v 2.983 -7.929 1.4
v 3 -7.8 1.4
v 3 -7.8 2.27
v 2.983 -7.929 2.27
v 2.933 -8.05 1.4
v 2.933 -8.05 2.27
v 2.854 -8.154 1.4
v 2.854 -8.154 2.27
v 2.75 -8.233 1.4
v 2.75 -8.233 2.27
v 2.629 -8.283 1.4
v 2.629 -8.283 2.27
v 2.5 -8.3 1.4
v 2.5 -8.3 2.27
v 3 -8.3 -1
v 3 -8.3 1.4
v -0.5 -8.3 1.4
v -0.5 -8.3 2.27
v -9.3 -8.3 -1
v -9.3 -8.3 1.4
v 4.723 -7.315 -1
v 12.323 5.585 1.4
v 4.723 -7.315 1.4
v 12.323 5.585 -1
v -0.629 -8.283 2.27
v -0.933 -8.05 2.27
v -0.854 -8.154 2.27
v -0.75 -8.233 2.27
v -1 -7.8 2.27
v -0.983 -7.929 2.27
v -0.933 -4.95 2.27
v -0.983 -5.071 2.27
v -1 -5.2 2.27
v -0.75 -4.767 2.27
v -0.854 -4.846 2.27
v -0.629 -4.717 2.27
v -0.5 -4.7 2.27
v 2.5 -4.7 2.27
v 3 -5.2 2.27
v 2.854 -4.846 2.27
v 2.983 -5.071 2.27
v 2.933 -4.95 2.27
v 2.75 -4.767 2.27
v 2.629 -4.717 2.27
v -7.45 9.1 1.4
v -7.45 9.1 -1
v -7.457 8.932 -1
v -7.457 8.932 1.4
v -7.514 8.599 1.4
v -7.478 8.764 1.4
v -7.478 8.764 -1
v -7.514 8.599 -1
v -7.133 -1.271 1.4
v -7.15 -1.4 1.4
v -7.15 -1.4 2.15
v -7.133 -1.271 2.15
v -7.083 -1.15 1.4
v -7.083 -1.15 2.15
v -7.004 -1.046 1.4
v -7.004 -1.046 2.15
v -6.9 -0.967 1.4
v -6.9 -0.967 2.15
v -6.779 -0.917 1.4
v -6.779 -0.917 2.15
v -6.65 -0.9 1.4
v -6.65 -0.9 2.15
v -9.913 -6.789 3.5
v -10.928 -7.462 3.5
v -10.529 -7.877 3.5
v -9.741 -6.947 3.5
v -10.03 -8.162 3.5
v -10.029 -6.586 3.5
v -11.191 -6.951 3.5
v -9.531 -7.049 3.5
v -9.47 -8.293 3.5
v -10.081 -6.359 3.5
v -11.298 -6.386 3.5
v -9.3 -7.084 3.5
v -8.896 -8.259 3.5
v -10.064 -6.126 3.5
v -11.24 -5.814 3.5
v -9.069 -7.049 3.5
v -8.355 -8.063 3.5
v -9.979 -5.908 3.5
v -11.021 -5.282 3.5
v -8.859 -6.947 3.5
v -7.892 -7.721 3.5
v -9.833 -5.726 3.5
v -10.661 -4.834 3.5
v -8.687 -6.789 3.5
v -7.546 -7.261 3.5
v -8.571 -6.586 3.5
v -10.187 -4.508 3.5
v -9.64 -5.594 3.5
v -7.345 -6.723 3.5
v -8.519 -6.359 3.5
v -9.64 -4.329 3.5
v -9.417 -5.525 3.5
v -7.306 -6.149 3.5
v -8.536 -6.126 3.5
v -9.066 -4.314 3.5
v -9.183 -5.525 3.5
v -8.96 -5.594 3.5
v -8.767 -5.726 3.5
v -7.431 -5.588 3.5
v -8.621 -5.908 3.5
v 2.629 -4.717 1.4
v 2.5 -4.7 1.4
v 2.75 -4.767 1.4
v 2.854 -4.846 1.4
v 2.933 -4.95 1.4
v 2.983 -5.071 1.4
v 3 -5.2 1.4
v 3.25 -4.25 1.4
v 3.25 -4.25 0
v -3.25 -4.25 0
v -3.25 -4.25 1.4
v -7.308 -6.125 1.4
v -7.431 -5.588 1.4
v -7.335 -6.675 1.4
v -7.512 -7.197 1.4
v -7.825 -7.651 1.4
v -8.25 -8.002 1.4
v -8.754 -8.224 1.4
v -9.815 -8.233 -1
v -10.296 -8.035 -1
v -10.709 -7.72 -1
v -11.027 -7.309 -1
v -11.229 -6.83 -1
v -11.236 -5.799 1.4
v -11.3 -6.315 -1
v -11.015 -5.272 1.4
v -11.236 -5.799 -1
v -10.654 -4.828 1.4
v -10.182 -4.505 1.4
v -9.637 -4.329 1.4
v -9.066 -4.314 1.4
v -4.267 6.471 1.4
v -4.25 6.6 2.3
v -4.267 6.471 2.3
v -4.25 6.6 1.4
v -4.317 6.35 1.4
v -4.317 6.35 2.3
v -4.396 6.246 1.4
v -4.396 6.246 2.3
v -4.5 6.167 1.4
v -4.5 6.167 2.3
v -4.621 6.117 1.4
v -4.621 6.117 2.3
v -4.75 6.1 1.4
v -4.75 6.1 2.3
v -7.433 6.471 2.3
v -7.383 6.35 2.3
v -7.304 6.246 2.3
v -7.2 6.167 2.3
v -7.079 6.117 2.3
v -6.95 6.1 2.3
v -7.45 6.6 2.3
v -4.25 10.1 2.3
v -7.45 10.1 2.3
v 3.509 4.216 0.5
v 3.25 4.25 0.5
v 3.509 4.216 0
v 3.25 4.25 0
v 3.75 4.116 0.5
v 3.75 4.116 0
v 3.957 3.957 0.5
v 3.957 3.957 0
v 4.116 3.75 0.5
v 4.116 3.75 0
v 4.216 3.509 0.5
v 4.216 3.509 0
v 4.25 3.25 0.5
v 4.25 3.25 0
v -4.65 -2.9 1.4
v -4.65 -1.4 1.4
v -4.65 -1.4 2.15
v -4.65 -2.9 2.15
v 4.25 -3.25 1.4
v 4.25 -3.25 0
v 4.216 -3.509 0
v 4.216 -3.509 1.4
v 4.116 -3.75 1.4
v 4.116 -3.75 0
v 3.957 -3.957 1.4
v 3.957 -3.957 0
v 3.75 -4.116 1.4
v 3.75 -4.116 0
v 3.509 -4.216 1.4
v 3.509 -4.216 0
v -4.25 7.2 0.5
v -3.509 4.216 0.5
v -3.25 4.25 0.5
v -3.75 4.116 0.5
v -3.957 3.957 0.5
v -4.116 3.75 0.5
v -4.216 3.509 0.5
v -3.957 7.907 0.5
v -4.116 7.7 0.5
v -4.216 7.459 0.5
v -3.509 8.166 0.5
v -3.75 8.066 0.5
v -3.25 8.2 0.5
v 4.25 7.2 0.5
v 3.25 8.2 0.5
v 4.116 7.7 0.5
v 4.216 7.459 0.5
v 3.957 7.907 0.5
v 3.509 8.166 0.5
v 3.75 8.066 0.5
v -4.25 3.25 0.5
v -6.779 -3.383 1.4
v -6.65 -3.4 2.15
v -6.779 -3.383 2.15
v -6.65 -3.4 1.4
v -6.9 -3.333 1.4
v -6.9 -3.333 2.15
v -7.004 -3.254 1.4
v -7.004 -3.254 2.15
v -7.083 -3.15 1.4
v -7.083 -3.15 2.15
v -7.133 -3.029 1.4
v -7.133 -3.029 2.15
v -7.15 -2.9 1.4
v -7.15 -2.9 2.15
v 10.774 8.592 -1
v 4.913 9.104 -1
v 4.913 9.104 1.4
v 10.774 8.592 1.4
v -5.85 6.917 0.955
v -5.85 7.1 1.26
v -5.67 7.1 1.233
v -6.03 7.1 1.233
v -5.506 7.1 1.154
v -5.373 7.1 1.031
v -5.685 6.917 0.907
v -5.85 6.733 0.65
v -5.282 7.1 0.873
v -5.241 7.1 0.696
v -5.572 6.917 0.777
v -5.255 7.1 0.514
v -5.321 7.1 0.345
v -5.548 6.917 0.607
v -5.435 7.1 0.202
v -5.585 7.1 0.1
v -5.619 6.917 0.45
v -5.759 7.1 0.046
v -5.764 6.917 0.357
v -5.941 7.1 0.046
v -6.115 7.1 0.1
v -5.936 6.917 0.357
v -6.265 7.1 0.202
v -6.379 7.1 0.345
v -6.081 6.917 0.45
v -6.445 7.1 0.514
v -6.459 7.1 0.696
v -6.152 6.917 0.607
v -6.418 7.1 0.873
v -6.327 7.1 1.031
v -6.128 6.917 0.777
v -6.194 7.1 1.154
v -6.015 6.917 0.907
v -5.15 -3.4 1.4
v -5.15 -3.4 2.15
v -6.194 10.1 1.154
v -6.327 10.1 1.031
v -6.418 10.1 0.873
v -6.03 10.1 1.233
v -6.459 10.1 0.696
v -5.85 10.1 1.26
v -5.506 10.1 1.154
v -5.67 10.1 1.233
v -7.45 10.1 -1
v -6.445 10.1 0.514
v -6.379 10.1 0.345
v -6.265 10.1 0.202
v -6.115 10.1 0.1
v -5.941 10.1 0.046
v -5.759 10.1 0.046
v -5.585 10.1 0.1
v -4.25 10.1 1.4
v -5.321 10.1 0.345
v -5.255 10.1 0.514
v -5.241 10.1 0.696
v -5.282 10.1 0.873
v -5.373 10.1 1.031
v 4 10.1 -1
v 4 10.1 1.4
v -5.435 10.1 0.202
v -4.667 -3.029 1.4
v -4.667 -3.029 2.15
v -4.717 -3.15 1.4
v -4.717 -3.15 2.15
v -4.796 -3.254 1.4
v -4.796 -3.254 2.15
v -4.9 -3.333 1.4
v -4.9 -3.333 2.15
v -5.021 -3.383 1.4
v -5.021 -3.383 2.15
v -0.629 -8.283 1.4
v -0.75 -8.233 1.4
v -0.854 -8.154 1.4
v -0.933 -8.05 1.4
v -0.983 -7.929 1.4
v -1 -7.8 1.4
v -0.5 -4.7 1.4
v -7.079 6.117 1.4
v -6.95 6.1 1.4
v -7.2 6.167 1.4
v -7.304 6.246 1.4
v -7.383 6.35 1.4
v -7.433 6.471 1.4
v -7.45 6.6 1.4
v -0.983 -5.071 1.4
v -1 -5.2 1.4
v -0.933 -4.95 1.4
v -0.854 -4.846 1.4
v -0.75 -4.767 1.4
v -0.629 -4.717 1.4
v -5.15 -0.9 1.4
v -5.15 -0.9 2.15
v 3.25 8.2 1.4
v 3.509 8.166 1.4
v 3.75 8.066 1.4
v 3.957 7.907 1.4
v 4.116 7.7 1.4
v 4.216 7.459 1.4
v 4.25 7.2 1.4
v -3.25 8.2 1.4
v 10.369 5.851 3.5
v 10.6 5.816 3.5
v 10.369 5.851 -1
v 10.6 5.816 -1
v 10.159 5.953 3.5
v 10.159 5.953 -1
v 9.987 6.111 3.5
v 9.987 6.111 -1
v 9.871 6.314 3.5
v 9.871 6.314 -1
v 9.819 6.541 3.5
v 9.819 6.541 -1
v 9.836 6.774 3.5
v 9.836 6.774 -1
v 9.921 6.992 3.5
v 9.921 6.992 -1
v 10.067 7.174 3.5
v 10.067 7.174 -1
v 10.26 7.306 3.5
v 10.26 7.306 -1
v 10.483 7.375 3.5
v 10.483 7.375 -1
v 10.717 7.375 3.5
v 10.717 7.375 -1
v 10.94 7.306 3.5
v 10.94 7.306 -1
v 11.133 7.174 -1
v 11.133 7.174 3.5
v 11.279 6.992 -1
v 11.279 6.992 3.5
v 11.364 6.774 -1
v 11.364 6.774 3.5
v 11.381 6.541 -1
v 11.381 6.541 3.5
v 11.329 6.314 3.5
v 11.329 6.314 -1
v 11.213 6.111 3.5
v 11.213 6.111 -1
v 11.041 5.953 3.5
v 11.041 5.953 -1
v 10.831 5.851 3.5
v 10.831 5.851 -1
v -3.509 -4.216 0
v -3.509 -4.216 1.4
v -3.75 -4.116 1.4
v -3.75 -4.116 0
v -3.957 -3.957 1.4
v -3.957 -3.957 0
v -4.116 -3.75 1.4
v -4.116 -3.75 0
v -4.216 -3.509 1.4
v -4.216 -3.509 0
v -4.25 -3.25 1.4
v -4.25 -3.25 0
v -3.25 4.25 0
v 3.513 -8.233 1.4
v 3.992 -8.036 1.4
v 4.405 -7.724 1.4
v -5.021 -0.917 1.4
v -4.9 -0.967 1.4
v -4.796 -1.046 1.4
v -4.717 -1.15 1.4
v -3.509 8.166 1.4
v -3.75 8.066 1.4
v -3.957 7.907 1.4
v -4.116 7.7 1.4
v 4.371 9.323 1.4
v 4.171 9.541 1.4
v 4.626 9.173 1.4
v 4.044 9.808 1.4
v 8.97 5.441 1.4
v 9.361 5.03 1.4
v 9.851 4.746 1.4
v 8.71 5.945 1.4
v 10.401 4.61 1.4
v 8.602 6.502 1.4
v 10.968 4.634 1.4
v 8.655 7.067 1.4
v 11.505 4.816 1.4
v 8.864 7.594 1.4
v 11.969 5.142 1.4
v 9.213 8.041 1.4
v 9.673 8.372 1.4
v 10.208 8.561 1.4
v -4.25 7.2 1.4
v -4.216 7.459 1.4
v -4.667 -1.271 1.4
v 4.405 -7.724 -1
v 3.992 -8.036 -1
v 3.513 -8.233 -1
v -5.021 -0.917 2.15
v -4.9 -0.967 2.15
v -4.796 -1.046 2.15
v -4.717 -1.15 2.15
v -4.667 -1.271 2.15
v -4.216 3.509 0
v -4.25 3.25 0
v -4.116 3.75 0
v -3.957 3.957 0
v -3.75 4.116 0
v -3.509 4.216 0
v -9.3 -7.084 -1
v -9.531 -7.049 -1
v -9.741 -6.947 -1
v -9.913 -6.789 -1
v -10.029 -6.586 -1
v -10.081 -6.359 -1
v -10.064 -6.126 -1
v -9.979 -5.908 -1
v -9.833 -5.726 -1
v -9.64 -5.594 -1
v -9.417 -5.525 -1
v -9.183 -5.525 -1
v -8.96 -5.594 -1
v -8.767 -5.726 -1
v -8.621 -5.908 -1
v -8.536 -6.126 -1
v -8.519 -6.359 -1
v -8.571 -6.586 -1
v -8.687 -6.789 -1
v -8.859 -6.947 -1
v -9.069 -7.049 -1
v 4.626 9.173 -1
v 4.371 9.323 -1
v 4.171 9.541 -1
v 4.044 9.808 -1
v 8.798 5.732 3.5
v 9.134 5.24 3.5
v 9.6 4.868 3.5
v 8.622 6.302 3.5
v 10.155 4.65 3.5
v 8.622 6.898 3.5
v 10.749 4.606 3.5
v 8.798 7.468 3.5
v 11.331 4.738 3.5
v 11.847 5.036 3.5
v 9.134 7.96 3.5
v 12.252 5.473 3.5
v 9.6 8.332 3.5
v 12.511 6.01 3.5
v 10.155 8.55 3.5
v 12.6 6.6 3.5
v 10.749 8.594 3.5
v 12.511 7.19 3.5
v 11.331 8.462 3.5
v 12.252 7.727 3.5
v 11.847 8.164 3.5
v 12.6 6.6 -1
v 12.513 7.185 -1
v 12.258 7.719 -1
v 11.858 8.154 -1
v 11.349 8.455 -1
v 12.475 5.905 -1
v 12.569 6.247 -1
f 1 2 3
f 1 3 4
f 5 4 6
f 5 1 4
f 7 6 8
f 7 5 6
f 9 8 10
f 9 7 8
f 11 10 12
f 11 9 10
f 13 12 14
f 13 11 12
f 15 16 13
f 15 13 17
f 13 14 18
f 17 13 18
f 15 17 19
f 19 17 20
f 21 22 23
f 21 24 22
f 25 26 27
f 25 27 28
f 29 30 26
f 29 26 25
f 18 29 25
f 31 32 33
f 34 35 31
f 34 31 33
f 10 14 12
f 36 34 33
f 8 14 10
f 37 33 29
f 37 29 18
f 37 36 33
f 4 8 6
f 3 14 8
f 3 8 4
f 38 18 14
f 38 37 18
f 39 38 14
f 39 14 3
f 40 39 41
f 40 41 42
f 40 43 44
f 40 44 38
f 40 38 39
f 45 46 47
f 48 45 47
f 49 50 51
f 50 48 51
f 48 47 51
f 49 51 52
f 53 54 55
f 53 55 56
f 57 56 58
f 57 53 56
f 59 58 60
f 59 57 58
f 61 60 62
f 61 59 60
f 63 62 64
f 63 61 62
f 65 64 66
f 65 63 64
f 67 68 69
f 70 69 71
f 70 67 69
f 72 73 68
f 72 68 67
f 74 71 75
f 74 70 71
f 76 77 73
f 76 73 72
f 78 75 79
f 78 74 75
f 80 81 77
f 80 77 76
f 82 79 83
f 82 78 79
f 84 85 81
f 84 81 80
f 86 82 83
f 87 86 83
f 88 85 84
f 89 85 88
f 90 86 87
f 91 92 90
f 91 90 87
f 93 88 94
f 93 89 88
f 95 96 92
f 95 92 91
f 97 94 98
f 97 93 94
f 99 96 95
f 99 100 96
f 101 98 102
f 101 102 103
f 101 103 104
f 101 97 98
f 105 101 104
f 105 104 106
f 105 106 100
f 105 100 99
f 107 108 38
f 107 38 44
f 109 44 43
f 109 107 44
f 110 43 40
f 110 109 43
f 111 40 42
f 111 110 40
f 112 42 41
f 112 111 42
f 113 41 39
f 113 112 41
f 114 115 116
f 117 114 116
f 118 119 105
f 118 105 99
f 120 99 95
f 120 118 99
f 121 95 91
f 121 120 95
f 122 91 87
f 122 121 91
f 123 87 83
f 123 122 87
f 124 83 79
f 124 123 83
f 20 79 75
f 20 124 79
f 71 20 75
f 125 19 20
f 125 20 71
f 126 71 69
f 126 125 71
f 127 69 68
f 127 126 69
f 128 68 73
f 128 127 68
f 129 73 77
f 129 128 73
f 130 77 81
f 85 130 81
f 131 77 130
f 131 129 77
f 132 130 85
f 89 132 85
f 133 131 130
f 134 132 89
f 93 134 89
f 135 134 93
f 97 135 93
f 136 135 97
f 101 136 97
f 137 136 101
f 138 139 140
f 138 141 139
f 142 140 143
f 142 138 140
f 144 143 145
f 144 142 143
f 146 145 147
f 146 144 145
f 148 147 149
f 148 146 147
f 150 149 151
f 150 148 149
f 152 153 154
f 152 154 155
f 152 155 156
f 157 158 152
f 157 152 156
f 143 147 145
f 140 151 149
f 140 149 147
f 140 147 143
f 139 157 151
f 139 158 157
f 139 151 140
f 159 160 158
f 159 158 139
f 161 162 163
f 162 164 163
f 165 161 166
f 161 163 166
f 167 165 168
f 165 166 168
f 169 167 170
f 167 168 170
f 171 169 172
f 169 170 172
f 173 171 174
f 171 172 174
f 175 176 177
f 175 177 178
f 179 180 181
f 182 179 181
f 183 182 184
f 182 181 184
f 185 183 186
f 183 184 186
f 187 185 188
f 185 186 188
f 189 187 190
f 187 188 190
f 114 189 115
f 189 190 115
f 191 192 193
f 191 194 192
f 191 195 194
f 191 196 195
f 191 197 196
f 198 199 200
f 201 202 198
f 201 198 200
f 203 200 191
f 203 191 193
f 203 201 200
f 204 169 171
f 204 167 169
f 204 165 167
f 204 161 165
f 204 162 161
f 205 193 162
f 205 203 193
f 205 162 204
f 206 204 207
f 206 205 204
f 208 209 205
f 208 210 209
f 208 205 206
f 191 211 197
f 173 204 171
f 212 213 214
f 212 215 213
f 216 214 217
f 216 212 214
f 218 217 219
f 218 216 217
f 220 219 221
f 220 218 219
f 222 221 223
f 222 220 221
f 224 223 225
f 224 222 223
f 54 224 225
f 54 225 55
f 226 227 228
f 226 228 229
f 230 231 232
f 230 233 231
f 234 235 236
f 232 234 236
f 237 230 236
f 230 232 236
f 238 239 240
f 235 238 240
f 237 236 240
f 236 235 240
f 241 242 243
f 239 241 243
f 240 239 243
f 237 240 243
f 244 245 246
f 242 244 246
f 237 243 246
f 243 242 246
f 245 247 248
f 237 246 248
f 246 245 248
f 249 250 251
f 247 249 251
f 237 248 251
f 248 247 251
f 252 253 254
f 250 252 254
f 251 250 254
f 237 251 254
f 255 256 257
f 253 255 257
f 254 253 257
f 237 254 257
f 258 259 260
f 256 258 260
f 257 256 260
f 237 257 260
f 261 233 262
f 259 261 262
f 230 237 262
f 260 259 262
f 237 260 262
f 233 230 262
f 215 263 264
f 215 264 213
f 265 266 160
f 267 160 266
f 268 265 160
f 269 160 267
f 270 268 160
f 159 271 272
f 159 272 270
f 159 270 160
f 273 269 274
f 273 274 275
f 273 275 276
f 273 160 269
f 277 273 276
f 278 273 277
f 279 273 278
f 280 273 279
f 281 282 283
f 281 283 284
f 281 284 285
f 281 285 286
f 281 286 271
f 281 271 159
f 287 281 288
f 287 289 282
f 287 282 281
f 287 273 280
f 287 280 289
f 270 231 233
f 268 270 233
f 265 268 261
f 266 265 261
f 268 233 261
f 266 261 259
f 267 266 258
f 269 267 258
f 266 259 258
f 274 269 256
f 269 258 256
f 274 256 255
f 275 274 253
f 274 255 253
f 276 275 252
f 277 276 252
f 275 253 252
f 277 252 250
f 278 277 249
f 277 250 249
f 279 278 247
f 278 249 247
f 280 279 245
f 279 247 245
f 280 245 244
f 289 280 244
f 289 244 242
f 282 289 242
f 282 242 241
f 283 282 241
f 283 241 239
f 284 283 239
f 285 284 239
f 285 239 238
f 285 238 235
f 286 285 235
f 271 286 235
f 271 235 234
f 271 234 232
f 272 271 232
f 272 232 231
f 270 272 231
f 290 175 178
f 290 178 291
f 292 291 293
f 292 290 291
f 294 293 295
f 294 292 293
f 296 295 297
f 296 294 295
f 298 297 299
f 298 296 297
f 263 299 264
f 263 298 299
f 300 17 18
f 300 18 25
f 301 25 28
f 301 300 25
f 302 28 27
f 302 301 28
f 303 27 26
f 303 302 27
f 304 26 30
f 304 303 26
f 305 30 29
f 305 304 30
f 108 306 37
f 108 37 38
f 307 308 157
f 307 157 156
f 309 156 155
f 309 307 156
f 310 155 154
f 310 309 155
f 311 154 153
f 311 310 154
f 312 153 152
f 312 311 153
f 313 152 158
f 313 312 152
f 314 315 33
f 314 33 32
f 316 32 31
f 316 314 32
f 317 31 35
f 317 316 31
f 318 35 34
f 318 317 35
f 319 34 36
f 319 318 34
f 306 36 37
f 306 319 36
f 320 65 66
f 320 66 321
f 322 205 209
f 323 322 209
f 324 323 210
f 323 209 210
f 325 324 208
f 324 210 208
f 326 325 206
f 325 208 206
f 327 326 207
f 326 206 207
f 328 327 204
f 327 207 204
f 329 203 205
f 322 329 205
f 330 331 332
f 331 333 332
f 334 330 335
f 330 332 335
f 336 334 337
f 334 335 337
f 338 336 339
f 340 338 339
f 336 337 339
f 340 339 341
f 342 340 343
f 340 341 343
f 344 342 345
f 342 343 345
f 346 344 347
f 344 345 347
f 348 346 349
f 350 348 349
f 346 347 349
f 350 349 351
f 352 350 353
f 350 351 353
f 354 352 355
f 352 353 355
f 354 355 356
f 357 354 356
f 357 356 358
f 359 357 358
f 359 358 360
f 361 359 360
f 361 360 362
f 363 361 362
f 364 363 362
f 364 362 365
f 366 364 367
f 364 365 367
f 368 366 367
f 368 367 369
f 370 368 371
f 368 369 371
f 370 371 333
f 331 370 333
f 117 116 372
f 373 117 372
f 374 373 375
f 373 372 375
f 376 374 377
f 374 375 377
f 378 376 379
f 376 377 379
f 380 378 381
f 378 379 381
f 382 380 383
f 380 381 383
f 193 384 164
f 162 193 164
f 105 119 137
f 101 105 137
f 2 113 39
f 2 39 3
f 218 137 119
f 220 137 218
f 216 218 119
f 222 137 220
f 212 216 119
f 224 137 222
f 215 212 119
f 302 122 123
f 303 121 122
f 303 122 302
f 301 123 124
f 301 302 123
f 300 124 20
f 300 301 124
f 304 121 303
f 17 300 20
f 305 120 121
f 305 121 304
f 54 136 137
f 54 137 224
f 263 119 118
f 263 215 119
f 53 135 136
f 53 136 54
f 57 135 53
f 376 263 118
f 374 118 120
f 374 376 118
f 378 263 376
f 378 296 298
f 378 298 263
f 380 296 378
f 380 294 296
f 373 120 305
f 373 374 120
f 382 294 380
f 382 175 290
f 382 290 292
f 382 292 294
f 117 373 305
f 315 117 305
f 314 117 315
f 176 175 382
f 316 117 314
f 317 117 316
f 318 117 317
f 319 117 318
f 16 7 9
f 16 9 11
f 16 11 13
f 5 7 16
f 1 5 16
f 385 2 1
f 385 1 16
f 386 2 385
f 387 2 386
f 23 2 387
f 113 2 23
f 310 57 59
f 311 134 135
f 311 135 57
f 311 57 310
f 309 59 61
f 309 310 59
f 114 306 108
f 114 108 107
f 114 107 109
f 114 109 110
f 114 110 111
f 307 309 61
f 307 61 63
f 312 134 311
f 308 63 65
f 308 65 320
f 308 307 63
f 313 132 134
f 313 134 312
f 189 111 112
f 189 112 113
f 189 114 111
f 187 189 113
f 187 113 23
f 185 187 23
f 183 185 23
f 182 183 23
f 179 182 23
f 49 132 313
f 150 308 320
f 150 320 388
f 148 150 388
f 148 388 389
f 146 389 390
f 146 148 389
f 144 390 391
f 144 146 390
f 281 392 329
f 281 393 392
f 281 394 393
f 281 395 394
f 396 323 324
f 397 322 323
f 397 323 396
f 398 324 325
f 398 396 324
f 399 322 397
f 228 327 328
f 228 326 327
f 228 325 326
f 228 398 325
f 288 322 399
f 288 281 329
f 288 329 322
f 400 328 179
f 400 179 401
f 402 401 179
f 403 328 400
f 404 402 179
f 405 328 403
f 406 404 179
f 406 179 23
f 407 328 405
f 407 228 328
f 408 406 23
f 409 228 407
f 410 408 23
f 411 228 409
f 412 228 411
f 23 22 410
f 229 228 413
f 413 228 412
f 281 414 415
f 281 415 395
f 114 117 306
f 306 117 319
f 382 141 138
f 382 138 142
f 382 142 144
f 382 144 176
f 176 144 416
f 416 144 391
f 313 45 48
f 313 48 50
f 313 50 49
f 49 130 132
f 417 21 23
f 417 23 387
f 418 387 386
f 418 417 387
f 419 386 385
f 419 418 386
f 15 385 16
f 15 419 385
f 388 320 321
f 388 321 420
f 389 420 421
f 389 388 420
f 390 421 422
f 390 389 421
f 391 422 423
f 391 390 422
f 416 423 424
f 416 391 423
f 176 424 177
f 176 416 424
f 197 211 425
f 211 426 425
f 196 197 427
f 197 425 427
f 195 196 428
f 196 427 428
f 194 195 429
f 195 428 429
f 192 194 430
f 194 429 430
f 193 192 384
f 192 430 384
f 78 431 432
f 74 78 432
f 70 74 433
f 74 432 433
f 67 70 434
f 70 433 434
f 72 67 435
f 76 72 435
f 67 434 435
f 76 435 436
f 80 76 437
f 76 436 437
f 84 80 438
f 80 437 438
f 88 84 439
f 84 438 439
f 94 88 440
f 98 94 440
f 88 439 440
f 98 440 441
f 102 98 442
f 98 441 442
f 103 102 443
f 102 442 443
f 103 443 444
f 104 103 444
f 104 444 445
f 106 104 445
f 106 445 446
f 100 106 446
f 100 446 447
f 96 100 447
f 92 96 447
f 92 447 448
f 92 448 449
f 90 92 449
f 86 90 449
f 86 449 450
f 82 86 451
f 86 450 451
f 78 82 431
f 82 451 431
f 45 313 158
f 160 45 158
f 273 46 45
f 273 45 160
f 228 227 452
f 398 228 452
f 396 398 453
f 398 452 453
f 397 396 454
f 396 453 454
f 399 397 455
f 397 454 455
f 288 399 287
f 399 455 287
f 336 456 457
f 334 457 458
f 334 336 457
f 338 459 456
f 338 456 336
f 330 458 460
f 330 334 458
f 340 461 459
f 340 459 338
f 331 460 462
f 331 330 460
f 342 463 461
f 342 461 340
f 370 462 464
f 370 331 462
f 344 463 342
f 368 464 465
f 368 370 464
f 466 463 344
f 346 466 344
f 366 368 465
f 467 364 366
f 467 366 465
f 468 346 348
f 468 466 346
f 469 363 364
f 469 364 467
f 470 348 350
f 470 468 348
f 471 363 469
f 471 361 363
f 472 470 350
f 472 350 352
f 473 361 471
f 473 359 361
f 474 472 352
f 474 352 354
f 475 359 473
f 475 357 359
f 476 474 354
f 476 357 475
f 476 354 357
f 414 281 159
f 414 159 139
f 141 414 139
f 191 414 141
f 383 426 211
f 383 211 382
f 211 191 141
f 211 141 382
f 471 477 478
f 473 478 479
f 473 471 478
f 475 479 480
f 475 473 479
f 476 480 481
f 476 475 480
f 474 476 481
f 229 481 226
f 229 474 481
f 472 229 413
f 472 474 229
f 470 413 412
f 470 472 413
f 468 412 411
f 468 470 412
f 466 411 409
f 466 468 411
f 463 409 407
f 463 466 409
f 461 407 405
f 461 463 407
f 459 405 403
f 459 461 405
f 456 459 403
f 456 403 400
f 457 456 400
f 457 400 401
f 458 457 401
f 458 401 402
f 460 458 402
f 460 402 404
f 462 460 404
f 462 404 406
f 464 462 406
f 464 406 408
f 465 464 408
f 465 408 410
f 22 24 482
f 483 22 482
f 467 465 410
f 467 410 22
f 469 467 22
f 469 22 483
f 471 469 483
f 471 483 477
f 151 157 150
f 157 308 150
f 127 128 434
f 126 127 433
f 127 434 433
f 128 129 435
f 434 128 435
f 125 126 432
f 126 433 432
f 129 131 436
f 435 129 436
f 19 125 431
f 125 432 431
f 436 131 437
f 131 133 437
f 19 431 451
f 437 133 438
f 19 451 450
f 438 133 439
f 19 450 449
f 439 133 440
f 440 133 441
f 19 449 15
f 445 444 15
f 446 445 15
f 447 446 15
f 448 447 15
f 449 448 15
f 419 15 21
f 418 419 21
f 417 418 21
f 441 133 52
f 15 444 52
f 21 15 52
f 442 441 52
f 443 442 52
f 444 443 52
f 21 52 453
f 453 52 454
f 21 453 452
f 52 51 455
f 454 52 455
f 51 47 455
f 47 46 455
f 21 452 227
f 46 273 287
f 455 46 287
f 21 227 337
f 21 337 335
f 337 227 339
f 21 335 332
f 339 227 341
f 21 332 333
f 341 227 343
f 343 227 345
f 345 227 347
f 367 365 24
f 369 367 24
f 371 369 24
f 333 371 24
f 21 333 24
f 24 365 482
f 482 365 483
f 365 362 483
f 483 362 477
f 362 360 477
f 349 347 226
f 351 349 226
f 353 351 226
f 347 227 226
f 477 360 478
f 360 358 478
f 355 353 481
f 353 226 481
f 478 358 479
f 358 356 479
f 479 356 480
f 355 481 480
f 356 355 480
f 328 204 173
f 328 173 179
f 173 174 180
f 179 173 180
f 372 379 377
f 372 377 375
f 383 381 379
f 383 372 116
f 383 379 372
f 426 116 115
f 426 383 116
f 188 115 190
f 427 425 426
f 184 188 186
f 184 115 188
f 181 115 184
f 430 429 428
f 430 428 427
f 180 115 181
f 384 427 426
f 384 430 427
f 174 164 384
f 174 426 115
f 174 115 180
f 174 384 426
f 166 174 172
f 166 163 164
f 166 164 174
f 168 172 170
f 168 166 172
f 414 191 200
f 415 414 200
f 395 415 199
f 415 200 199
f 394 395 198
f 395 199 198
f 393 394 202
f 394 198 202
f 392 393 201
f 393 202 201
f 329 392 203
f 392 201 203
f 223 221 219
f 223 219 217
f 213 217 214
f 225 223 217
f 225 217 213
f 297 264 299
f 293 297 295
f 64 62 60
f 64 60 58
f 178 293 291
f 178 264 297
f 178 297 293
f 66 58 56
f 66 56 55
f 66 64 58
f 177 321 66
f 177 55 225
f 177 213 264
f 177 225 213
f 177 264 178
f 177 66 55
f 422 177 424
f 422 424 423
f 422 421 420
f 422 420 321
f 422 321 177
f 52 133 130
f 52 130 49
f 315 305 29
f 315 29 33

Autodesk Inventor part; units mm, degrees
ref_plane "YZ Plane" through (0, 0, 0) normal (1, 0, 0) x (0, 1, 0)
ref_plane "XZ Plane" through (0, 0, 0) normal (0, 1, 0) x (-1, 0, 0)
ref_plane "XY Plane" through (0, 0, 0) normal (0, 0, 1) x (1, 0, 0)
sketch "Sketch9" plane through (0, 0, 0) normal (0, 0, 1) x (1, 0, 0)
  circle A0 centre (-9.3, -6.3) radius 2
  circle A1 centre (10.6, 6.6) radius 2
  line L0 (3.75, -3.75) -> (-3.75, -3.75) construction
  line L1 (-3.75, -3.75) -> (-3.75, 3.75) construction
  line L2 (-3.75, 3.75) -> (3.75, 3.75) construction
  line L3 (3.75, 3.75) -> (3.75, -3.75) construction
  line L4 (3.75, -3.75) -> (-3.75, 3.75) construction
  line L5 (-3.75, -3.75) -> (3.75, 3.75) construction
  line L6 (-4.95, -3.125) -> (-6.85, -3.125) construction
  line L7 (-6.85, -3.125) -> (-6.85, -1.175) construction
  line L8 (-6.85, -1.175) -> (-4.95, -1.175) construction
  line L9 (-4.95, -1.175) -> (-4.95, -3.125) construction
  line L10 (-4.95, -3.125) -> (-6.85, -1.175) construction
  line L11 (-6.85, -3.125) -> (-4.95, -1.175) construction
  line L12 (2.575, -4.925) -> (-0.575, -4.925) construction
  line L13 (-0.575, -4.925) -> (-0.575, -8.075) construction
  line L14 (-0.575, -8.075) -> (2.575, -8.075) construction
  line L15 (2.575, -8.075) -> (2.575, -4.925) construction
  line L16 (2.575, -4.925) -> (-0.575, -8.075) construction
  line L17 (-0.575, -4.925) -> (2.575, -8.075) construction
  line L18 (12.3232, 5.5848) -> (4.7232, -7.3152)
  arc A2 (3, -8.3) -> (4.7232, -7.3152) centre (3, -6.3) ccw
  line L19 (3, -8.3) -> (-9.3, -8.3)
  line L20 (-11.2363, -5.7994) -> (-7.5137, 8.5994)
  arc A3 (-7.5137, 8.5994) -> (-7.45, 9.1) centre (-9.45, 9.1) ccw
  line L21 (-7.45, 9.1) -> (-7.45, 10.1)
  line L22 (-7.45, 10.1) -> (4, 10.1)
  arc A4 (4, 10.1) -> (4.9131, 9.1038) centre (5, 10.1) ccw
  line L23 (4.9131, 9.1038) -> (10.7738, 8.5924)
  line L24 (3.25, -4.25) -> (-3.25, -4.25)
  line L25 (-4.25, -3.25) -> (-4.25, 3.25)
  line L26 (-3.25, 4.25) -> (3.25, 4.25)
  line L27 (4.25, 3.25) -> (4.25, -3.25)
  arc A5 (3.25, -4.25) -> (4.25, -3.25) centre (3.25, -3.25) ccw
  arc A6 (-4.25, -3.25) -> (-3.25, -4.25) centre (-3.25, -3.25) ccw
  arc A7 (-3.25, 4.25) -> (-4.25, 3.25) centre (-3.25, 3.25) ccw
  arc A8 (4.25, 3.25) -> (3.25, 4.25) centre (3.25, 3.25) ccw
  line L28 (1.7, 7.8) -> (-2.3, 7.8) construction
  line L29 (-2.3, 7.8) -> (-2.3, 5) construction
  line L30 (-2.3, 5) -> (1.7, 5) construction
  line L31 (1.7, 5) -> (1.7, 7.8) construction
  line L32 (1.7, 7.8) -> (-2.3, 5) construction
  line L33 (-2.3, 7.8) -> (1.7, 5) construction
  line L34 (-4.25, 3.25) -> (-4.25, 7.2)
  arc A9 (-3.25, 8.2) -> (-4.25, 7.2) centre (-3.25, 7.2) ccw
  line L35 (-3.25, 8.2) -> (3.25, 8.2)
  arc A10 (4.25, 7.2) -> (3.25, 8.2) centre (3.25, 7.2) ccw
  line L36 (4.25, 7.2) -> (4.25, 3.25)
  line L37 (-5.15, -3.4) -> (-6.65, -3.4)
  line L38 (-7.15, -2.9) -> (-7.15, -1.4)
  line L39 (-6.65, -0.9) -> (-5.15, -0.9)
  line L40 (-4.65, -1.4) -> (-4.65, -2.9)
  arc A11 (-5.15, -3.4) -> (-4.65, -2.9) centre (-5.15, -2.9) ccw
  arc A12 (-4.65, -1.4) -> (-5.15, -0.9) centre (-5.15, -1.4) ccw
  arc A13 (-6.65, -0.9) -> (-7.15, -1.4) centre (-6.65, -1.4) ccw
  arc A14 (-7.15, -2.9) -> (-6.65, -3.4) centre (-6.65, -2.9) ccw
  line L41 (2.5, -8.3) -> (-0.5, -8.3)
  line L42 (-1, -7.8) -> (-1, -5.2)
  line L43 (-0.5, -4.7) -> (2.5, -4.7)
  line L44 (3, -5.2) -> (3, -7.8)
  arc A15 (2.5, -8.3) -> (3, -7.8) centre (2.5, -7.8) ccw
  arc A16 (3, -5.2) -> (2.5, -4.7) centre (2.5, -5.2) ccw
  arc A17 (-0.5, -4.7) -> (-1, -5.2) centre (-0.5, -5.2) ccw
  arc A18 (-1, -7.8) -> (-0.5, -8.3) centre (-0.5, -7.8) ccw
  circle A19 centre (-7.6029, -4.1225) radius 1.05 construction
  line L45 (-9.3, -6.3) -> (-6.65, -2.9) construction
  line L46 (-7.4312, -5.5876) -> (-9.0655, -4.3138)
  line L47 (-4.25, 10.1) -> (-4.25, 7.2)
  line L48 (-7.45, 9.1) -> (-7.45, 6.6)
  arc A20 (-7.45, 6.6) -> (-6.95, 6.1) centre (-6.95, 6.6) ccw
  line L49 (-6.95, 6.1) -> (-4.75, 6.1)
  arc A21 (-4.75, 6.1) -> (-4.25, 6.6) centre (-4.75, 6.6) ccw
  point P0 (0, 0)
  point P1 (0, 0)
  point P2 (-5.9, -2.15)
  point P3 (1, -6.5)
  point P4 (0, 0)
  point P5 (0, -4.25)
  point P6 (0, 0)
  point P7 (-4.25, 0)
  point P8 (-0.3, 6.4)
  point P9 (1, -4.925)
  point P10 (1, -4.7)
  point P11 (-1, -6.5)
  point P12 (-0.575, -6.5)
  point P13 (-5.9, -3.4)
  point P14 (-5.9, -3.125)
  point P15 (-4.65, -2.15)
  point P16 (-4.95, -2.15)
  dimension "d71" = 4
  dimension "d72" = 19.9
  dimension "d73" = 12.9
  dimension "d74" = 9.3
  dimension "d75" = 6.3
  dimension "d76" = 7.5
  dimension "d77" = 5.9
  dimension "d78" = 2.15
  dimension "d79" = 1.9
  dimension "d80" = 1.95
  dimension "d81" = 6.5
  dimension "d82" = 1
  dimension "d83" = 3.15
  dimension "d95" = 2
  dimension "d96" = 3
  dimension "d97" = 10.1
  dimension "d103" = 1
  dimension "d104" = 8.5
  dimension "d107" = 6.4
  dimension "d108" = 2.8
  dimension "d109" = 4
  dimension "d110" = 0.3
  dimension "d111" = 1.8
  dimension "d114" = 0.5
  dimension "d115" = 0.5
  dimension "d116" = 4
  dimension "d117" = 2.5
  dimension "d118" = 2.5
  dimension "d119" = 2.1
  dimension "d120" = 1.7107
  dimension "d125" = 1
  dimension "d127" = 1
  dimension "d128" = 4
  dimension "d129" = 3.2
  dimension "d130" = 4
extrude "Extrusion7" add sketch "Sketch9" along normal blind 3.5 and the other way blind 1 contours A0 L46 | A1 picked at (-9.5, -5.1238)
sketch "Sketch10" plane through (10.6, 6.6, 3.5) normal (0, 0, 1) x (1, 0, 0)
  arc A0 (-19.6655, -10.9138) -> (-18.0312, -12.1876) centre (-19.9, -12.9) ccw projected
  circle A1 centre (0, 0) radius 2 projected
  line L0 (-18.0312, -12.1876) -> (-19.6655, -10.9138) projected
  point P0 (-10.6, -6.6)
hole "Hole3" at (10.6, 6.6, 3.5) at (-9.3, -6.3, 3.5) direction (0, 0, -1) diameter 1.567 end through all thread size "M2x0.4" class "6H" standard "ANSI Metric M Profile"
extrude "Extrusion8" add sketch "Sketch9" against normal up to surface (1 mm away) contours A0 L20 A3 L48 A20 L49 A21 L34 L25 A6 L24 A5 L27 L36 A10 L35 A9 L47 L22 A4 L23 A1 L18 A2 L19 A15 L44 A16 L43 A17 L42 A18 | L46 A0 | A18 L42 A17 L43 A16 L44 A15 L19 | L21 L22 L47 L34 A21 L49 A20 L48 | A9 L35 A10 L36 A8 L26 A7 L34 | A7 L26 A8 L27 A5 L24 A6 L25 | L37 A14 L38 A13 L39 A12 L40 A11 picked at (-8.1343, -4.9223)
extrude "Extrusion9" add sketch "Sketch9" along normal blind 0.5 contours A0 L20 A3 L48 A20 L49 A21 L34 L25 A6 L24 A5 L27 L36 A10 L35 A9 L47 L22 A4 L23 A1 L18 A2 L19 A15 L44 A16 L43 A17 L42 A18 | L46 A0 | A18 L42 A17 L43 A16 L44 A15 L19 | L21 L22 L47 L34 A21 L49 A20 L48 | A9 L35 A10 L36 A8 L26 A7 L34 | L37 A14 L38 A13 L39 A12 L40 A11 picked at (-8.1343, -4.9223)
extrude "Extrusion10" add sketch "Sketch9" along normal blind 1.4 contours A0 L20 A3 L48 A20 L49 A21 L34 L25 A6 L24 A5 L27 L36 A10 L35 A9 L47 L22 A4 L23 A1 L18 A2 L19 A15 L44 A16 L43 A17 L42 A18 | L46 A0 | A18 L42 A17 L43 A16 L44 A15 L19 | L21 L22 L47 L34 A21 L49 A20 L48 | L37 A14 L38 A13 L39 A12 L40 A11 picked at (-8.1343, -4.9223)
extrude "Extrusion11" add sketch "Sketch9" along normal blind 2.27 contours A18 L42 A17 L43 A16 L44 A15 L19
extrude "Extrusion12" add sketch "Sketch9" along normal blind 2.15 contours L37 A14 L38 A13 L39 A12 L40 A11
extrude "Extrusion13" add sketch "Sketch9" along normal blind 2.3 contours L21 L22 L47 L34 A21 L49 A20 L48
sketch "Sketch11" plane through (-7.45, 10.1, -1) normal (0, 1, 0) x (1, 0, 0)
  line L0 (0, 0) -> (0, -3.3) projected
  line L1 (3.2, -3.3) -> (0, -3.3) projected
  line L2 (3.2, -2.4) -> (3.2, -3.3) projected
  line L3 (11.45, -2.4) -> (3.2, -2.4) projected
  line L4 (11.45, 0) -> (11.45, -2.4) projected
  line L5 (0, 0) -> (11.45, 0) projected
  line L6 (0, 0) -> (11.45, 0) construction
  line L7 (0, 0) -> (3.2, -3.3) construction
  point P0 (7.45, -1)
  point P1 (1.6, -1.65)
hole "Hole4" at (-5.85, 10.1, 0.65) direction (0, -1, 0) diameter 1.221 depth 3 tip angle 118 thread size "M1.6x0.35" class "6H" standard "ANSI Metric M Profile"
equation "\"SilPad\" = 0.35"
properties part number "EPS_RegulatorHeatsink-A" material "Aluminum 6061"
